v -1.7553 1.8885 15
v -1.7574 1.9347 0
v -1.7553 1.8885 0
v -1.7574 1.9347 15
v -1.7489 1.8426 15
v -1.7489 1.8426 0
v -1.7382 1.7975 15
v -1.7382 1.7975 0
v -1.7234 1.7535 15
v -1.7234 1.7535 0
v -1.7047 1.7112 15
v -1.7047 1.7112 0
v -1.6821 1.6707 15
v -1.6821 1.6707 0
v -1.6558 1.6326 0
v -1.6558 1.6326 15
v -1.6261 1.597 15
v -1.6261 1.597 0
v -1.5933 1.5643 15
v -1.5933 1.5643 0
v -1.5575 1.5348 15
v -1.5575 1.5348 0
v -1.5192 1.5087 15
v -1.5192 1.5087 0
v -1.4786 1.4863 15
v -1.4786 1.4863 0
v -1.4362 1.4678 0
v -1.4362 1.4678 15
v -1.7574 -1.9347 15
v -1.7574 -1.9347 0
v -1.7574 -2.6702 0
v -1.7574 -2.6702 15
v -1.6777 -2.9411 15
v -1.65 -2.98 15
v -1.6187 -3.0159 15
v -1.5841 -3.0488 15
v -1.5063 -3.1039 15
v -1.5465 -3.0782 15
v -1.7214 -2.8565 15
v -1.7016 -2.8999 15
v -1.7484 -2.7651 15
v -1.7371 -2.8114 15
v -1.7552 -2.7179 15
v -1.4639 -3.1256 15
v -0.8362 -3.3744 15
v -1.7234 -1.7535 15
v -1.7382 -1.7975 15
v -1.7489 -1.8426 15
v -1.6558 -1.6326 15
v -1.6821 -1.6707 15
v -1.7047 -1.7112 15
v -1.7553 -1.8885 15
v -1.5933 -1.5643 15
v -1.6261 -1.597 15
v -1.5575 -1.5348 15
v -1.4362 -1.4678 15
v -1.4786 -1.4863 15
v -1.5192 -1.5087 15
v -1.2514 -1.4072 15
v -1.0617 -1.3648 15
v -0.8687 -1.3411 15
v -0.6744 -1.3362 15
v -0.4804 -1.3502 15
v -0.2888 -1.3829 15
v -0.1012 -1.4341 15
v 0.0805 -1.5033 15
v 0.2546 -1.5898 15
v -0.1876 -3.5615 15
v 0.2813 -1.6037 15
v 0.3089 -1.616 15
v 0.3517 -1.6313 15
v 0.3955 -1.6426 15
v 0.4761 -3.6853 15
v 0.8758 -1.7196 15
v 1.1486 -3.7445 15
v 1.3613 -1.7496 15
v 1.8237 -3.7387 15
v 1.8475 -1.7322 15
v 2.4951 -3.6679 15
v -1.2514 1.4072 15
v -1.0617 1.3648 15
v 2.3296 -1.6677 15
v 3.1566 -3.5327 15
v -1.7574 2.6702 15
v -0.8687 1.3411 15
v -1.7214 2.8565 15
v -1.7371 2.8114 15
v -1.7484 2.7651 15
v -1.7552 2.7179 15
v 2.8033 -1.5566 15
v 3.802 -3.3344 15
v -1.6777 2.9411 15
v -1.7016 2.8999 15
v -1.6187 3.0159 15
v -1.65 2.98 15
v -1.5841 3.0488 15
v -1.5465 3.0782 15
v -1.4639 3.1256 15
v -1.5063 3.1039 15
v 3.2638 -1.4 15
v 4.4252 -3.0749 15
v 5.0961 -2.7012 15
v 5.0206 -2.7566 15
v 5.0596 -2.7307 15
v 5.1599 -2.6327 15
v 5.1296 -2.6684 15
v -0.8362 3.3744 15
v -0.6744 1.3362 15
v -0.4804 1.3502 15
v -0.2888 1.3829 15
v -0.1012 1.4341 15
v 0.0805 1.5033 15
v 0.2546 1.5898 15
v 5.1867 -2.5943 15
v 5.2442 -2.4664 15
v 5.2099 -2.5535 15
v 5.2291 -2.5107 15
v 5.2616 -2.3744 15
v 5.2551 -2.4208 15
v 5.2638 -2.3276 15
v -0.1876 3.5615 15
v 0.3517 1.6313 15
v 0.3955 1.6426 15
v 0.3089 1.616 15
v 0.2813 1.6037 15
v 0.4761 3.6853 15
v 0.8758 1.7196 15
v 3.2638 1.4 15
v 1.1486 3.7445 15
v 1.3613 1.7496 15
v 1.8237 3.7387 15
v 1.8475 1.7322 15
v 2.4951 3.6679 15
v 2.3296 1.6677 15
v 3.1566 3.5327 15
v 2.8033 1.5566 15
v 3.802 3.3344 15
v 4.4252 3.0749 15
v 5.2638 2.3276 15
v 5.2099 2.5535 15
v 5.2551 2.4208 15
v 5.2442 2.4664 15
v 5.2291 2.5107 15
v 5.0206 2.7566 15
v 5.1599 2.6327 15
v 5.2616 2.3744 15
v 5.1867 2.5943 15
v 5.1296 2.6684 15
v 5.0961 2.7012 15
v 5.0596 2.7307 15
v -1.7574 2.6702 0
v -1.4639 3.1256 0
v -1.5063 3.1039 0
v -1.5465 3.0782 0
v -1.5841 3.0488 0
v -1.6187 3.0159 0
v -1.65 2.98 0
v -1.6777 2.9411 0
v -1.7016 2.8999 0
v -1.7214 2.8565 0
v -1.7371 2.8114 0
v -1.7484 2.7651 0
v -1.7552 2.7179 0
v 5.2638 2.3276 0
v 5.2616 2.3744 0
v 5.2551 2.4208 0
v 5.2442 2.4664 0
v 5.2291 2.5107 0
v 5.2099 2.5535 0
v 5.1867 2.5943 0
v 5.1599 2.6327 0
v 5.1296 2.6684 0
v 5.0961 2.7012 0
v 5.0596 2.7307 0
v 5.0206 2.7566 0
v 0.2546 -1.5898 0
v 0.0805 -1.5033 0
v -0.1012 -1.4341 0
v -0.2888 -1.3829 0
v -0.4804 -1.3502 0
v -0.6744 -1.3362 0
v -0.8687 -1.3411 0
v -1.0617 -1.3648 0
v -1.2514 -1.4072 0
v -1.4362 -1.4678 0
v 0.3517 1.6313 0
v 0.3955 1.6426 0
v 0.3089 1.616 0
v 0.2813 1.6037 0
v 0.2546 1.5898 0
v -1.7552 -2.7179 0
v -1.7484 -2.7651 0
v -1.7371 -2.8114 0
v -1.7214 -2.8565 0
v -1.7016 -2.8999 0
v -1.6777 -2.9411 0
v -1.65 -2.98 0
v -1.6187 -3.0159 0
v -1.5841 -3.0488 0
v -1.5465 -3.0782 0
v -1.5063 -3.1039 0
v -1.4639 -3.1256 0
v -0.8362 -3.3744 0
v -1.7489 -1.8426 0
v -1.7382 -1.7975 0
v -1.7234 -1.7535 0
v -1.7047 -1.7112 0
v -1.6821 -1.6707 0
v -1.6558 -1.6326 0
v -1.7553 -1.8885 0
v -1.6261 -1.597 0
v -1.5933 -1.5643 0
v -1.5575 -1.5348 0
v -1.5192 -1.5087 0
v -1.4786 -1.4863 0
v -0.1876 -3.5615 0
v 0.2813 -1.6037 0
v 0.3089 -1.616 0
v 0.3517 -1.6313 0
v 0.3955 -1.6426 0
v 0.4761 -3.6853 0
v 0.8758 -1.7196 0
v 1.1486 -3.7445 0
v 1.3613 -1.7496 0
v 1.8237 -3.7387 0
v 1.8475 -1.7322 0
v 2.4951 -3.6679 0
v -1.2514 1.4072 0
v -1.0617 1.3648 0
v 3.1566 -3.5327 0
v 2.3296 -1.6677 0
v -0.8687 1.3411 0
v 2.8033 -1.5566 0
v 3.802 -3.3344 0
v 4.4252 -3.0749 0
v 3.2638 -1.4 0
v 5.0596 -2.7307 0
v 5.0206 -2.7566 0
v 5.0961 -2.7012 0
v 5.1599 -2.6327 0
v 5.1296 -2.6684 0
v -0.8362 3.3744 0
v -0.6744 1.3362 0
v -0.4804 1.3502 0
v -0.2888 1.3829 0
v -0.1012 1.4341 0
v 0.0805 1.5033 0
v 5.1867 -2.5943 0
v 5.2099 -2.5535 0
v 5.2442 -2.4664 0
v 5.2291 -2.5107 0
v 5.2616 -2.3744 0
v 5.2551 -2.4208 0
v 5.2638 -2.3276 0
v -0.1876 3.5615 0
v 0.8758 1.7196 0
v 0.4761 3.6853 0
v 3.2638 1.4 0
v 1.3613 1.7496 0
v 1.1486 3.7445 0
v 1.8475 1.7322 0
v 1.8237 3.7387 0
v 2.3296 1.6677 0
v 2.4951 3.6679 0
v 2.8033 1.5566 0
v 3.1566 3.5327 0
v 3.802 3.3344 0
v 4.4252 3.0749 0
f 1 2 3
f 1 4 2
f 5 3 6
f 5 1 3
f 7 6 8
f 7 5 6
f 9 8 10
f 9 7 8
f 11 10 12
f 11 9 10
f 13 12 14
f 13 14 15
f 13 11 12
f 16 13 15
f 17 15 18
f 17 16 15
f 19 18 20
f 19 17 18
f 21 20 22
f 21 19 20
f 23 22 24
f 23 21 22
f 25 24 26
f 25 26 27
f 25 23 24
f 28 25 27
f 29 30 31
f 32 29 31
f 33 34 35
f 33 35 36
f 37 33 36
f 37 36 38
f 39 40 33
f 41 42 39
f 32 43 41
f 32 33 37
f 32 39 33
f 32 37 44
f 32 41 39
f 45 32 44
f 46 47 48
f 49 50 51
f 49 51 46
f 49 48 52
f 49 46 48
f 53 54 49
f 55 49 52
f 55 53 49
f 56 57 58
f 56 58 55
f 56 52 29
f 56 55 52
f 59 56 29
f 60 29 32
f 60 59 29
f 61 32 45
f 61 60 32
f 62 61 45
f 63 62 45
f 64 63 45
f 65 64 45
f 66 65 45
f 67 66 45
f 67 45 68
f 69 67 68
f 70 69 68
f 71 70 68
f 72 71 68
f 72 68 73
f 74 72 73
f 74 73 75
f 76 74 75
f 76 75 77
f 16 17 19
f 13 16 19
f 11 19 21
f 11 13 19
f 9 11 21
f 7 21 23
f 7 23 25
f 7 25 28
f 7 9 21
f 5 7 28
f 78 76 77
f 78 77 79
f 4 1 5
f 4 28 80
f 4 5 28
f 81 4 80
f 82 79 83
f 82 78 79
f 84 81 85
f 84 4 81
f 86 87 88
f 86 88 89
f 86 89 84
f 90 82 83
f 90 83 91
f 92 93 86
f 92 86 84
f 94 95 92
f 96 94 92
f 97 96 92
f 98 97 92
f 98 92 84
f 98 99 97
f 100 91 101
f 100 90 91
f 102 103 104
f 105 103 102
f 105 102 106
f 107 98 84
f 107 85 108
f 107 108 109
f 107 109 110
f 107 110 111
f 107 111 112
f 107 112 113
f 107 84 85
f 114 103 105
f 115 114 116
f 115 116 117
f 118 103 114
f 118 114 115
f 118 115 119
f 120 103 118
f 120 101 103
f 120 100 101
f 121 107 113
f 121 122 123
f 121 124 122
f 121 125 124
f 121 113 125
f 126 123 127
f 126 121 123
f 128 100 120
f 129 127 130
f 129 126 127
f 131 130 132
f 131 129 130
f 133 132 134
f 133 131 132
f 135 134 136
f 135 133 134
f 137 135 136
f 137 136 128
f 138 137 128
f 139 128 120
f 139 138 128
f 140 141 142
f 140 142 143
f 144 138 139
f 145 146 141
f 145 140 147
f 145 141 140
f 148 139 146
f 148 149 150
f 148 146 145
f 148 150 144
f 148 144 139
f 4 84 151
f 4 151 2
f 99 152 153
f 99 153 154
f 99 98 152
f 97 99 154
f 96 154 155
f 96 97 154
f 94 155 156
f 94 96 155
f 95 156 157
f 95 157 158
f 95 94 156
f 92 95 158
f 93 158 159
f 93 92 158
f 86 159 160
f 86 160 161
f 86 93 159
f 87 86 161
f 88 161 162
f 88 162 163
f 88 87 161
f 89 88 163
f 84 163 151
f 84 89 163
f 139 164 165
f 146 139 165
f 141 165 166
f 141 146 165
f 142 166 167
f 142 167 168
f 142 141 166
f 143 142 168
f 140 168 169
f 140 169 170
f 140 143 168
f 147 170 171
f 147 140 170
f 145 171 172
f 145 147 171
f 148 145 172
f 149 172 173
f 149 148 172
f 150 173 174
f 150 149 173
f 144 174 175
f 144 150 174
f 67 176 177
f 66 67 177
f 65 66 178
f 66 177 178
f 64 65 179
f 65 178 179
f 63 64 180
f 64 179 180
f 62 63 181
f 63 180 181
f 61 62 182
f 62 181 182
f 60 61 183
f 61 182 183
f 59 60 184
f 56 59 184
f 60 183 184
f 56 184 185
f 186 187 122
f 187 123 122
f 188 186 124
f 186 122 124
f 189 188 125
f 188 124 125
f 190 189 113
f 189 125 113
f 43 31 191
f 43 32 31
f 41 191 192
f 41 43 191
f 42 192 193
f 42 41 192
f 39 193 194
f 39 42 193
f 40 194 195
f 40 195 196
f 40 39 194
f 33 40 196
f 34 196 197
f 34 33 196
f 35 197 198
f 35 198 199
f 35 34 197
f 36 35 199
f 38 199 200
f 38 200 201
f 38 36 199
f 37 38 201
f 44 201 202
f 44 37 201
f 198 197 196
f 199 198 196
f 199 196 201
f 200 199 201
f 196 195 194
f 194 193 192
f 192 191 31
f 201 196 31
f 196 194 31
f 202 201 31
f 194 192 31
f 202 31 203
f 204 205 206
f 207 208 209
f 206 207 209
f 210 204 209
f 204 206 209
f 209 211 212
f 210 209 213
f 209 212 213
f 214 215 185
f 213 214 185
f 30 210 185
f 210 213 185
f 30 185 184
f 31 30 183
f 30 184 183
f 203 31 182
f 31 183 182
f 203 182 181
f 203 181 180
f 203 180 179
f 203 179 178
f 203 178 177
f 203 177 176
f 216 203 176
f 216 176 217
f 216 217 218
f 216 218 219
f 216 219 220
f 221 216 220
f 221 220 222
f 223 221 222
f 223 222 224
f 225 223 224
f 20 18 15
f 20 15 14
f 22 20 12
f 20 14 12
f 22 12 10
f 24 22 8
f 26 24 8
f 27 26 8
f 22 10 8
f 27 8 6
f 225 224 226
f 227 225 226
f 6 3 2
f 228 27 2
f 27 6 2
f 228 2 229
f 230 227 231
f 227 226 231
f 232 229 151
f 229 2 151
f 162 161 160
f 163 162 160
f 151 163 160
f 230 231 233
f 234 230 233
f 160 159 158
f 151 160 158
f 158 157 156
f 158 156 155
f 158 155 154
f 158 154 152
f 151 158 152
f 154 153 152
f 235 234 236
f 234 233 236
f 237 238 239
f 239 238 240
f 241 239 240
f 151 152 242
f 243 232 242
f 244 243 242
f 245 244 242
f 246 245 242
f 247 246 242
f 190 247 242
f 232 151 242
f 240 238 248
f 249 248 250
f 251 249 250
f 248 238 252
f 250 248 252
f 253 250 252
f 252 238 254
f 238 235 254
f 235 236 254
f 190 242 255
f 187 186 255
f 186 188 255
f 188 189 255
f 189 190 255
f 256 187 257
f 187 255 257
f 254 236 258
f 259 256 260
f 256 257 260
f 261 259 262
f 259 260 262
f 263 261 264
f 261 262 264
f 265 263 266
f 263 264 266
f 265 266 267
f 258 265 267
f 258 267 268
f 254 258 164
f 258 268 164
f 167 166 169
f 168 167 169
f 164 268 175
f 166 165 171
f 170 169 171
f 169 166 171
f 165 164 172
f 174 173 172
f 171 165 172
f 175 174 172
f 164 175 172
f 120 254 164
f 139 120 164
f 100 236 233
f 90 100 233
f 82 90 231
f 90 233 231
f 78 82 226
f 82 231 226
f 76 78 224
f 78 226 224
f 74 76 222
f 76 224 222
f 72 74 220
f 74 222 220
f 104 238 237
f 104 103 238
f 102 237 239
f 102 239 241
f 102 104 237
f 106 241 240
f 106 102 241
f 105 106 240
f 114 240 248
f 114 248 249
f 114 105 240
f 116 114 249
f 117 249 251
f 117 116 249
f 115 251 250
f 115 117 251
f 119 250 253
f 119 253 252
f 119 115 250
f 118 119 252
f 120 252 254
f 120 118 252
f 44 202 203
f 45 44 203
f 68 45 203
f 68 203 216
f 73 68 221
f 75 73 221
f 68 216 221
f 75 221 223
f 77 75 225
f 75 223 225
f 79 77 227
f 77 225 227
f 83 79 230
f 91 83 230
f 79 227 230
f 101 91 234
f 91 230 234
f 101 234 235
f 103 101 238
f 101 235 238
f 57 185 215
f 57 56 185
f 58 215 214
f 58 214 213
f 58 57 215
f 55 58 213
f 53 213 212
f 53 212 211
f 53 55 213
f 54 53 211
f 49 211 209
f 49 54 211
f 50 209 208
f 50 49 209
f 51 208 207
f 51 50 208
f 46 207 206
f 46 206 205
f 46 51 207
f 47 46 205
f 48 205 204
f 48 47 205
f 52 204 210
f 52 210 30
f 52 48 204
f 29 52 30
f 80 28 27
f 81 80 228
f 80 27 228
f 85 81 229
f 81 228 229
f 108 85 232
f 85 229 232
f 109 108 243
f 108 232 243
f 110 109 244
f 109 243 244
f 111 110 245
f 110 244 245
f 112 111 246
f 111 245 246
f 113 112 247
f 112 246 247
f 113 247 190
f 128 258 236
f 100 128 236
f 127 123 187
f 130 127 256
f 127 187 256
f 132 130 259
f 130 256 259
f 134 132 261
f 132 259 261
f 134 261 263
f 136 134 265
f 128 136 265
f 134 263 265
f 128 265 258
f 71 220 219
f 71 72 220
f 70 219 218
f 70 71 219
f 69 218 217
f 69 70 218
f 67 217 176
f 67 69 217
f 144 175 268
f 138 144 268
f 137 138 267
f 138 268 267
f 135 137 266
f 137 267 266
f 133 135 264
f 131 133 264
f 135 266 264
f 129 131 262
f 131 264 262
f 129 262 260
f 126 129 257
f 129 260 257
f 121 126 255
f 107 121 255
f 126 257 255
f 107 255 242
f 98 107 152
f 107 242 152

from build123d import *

# Parameters (mm, degrees)
F1_DEPTH = 15
F2_R     = 0.5


with BuildPart() as f1:
    # F0 (on Top) → F1 (new body)
    with BuildSketch(Plane.XY):
        with BuildLine():
            ThreePointArc((0.314997359, 1.625), (1.8064242174, 1.7355083888), (3.2638192562, 1.4))
            Line((3.2638192562, 1.4), (3.2638192562, -1.4))
            ThreePointArc((3.2638192562, -1.4), (1.8064242174, -1.7355083888), (0.314997359, -1.625))
            ThreePointArc((0.314997359, -1.625), (-0.7212203567, -1.3356293712), (-1.7574380725, -1.625))
            Line((-1.7574380725, -1.625), (-1.7574380725, -2.9842268265))
            ThreePointArc((-1.7574380725, -2.9842268265), (1.8043736859, -3.739767503), (5.2638192562, -2.604170276))
            Line((5.2638192562, -2.604170276), (5.2638192562, 2.604170276))
            ThreePointArc((5.2638192562, 2.604170276), (1.8043736859, 3.739767503), (-1.7574380725, 2.9842268265))
            Line((-1.7574380725, 2.9842268265), (-1.7574380725, 1.625))
            ThreePointArc((-1.7574380725, 1.625), (-0.7212203567, 1.3356293712), (0.314997359, 1.625))
        make_face()
    extrude(amount=F1_DEPTH)

    # F2
    f2_edges = [f1.edges().sort_by_distance(p)[0] for p in [
        (0.314997, 1.625, 7.5),
        (0.314997, -1.625, 7.5),
        (-1.757438, -1.625, 7.5),
        (-1.757438, -2.984227, 7.5),
        (5.263819, -2.60417, 7.5),
        (5.263819, 2.60417, 7.5),
        (-1.757438, 2.984227, 7.5),
        (-1.757438, 1.625, 7.5),
    ]]
    fillet(f2_edges, radius=F2_R)


solid = f1.part
